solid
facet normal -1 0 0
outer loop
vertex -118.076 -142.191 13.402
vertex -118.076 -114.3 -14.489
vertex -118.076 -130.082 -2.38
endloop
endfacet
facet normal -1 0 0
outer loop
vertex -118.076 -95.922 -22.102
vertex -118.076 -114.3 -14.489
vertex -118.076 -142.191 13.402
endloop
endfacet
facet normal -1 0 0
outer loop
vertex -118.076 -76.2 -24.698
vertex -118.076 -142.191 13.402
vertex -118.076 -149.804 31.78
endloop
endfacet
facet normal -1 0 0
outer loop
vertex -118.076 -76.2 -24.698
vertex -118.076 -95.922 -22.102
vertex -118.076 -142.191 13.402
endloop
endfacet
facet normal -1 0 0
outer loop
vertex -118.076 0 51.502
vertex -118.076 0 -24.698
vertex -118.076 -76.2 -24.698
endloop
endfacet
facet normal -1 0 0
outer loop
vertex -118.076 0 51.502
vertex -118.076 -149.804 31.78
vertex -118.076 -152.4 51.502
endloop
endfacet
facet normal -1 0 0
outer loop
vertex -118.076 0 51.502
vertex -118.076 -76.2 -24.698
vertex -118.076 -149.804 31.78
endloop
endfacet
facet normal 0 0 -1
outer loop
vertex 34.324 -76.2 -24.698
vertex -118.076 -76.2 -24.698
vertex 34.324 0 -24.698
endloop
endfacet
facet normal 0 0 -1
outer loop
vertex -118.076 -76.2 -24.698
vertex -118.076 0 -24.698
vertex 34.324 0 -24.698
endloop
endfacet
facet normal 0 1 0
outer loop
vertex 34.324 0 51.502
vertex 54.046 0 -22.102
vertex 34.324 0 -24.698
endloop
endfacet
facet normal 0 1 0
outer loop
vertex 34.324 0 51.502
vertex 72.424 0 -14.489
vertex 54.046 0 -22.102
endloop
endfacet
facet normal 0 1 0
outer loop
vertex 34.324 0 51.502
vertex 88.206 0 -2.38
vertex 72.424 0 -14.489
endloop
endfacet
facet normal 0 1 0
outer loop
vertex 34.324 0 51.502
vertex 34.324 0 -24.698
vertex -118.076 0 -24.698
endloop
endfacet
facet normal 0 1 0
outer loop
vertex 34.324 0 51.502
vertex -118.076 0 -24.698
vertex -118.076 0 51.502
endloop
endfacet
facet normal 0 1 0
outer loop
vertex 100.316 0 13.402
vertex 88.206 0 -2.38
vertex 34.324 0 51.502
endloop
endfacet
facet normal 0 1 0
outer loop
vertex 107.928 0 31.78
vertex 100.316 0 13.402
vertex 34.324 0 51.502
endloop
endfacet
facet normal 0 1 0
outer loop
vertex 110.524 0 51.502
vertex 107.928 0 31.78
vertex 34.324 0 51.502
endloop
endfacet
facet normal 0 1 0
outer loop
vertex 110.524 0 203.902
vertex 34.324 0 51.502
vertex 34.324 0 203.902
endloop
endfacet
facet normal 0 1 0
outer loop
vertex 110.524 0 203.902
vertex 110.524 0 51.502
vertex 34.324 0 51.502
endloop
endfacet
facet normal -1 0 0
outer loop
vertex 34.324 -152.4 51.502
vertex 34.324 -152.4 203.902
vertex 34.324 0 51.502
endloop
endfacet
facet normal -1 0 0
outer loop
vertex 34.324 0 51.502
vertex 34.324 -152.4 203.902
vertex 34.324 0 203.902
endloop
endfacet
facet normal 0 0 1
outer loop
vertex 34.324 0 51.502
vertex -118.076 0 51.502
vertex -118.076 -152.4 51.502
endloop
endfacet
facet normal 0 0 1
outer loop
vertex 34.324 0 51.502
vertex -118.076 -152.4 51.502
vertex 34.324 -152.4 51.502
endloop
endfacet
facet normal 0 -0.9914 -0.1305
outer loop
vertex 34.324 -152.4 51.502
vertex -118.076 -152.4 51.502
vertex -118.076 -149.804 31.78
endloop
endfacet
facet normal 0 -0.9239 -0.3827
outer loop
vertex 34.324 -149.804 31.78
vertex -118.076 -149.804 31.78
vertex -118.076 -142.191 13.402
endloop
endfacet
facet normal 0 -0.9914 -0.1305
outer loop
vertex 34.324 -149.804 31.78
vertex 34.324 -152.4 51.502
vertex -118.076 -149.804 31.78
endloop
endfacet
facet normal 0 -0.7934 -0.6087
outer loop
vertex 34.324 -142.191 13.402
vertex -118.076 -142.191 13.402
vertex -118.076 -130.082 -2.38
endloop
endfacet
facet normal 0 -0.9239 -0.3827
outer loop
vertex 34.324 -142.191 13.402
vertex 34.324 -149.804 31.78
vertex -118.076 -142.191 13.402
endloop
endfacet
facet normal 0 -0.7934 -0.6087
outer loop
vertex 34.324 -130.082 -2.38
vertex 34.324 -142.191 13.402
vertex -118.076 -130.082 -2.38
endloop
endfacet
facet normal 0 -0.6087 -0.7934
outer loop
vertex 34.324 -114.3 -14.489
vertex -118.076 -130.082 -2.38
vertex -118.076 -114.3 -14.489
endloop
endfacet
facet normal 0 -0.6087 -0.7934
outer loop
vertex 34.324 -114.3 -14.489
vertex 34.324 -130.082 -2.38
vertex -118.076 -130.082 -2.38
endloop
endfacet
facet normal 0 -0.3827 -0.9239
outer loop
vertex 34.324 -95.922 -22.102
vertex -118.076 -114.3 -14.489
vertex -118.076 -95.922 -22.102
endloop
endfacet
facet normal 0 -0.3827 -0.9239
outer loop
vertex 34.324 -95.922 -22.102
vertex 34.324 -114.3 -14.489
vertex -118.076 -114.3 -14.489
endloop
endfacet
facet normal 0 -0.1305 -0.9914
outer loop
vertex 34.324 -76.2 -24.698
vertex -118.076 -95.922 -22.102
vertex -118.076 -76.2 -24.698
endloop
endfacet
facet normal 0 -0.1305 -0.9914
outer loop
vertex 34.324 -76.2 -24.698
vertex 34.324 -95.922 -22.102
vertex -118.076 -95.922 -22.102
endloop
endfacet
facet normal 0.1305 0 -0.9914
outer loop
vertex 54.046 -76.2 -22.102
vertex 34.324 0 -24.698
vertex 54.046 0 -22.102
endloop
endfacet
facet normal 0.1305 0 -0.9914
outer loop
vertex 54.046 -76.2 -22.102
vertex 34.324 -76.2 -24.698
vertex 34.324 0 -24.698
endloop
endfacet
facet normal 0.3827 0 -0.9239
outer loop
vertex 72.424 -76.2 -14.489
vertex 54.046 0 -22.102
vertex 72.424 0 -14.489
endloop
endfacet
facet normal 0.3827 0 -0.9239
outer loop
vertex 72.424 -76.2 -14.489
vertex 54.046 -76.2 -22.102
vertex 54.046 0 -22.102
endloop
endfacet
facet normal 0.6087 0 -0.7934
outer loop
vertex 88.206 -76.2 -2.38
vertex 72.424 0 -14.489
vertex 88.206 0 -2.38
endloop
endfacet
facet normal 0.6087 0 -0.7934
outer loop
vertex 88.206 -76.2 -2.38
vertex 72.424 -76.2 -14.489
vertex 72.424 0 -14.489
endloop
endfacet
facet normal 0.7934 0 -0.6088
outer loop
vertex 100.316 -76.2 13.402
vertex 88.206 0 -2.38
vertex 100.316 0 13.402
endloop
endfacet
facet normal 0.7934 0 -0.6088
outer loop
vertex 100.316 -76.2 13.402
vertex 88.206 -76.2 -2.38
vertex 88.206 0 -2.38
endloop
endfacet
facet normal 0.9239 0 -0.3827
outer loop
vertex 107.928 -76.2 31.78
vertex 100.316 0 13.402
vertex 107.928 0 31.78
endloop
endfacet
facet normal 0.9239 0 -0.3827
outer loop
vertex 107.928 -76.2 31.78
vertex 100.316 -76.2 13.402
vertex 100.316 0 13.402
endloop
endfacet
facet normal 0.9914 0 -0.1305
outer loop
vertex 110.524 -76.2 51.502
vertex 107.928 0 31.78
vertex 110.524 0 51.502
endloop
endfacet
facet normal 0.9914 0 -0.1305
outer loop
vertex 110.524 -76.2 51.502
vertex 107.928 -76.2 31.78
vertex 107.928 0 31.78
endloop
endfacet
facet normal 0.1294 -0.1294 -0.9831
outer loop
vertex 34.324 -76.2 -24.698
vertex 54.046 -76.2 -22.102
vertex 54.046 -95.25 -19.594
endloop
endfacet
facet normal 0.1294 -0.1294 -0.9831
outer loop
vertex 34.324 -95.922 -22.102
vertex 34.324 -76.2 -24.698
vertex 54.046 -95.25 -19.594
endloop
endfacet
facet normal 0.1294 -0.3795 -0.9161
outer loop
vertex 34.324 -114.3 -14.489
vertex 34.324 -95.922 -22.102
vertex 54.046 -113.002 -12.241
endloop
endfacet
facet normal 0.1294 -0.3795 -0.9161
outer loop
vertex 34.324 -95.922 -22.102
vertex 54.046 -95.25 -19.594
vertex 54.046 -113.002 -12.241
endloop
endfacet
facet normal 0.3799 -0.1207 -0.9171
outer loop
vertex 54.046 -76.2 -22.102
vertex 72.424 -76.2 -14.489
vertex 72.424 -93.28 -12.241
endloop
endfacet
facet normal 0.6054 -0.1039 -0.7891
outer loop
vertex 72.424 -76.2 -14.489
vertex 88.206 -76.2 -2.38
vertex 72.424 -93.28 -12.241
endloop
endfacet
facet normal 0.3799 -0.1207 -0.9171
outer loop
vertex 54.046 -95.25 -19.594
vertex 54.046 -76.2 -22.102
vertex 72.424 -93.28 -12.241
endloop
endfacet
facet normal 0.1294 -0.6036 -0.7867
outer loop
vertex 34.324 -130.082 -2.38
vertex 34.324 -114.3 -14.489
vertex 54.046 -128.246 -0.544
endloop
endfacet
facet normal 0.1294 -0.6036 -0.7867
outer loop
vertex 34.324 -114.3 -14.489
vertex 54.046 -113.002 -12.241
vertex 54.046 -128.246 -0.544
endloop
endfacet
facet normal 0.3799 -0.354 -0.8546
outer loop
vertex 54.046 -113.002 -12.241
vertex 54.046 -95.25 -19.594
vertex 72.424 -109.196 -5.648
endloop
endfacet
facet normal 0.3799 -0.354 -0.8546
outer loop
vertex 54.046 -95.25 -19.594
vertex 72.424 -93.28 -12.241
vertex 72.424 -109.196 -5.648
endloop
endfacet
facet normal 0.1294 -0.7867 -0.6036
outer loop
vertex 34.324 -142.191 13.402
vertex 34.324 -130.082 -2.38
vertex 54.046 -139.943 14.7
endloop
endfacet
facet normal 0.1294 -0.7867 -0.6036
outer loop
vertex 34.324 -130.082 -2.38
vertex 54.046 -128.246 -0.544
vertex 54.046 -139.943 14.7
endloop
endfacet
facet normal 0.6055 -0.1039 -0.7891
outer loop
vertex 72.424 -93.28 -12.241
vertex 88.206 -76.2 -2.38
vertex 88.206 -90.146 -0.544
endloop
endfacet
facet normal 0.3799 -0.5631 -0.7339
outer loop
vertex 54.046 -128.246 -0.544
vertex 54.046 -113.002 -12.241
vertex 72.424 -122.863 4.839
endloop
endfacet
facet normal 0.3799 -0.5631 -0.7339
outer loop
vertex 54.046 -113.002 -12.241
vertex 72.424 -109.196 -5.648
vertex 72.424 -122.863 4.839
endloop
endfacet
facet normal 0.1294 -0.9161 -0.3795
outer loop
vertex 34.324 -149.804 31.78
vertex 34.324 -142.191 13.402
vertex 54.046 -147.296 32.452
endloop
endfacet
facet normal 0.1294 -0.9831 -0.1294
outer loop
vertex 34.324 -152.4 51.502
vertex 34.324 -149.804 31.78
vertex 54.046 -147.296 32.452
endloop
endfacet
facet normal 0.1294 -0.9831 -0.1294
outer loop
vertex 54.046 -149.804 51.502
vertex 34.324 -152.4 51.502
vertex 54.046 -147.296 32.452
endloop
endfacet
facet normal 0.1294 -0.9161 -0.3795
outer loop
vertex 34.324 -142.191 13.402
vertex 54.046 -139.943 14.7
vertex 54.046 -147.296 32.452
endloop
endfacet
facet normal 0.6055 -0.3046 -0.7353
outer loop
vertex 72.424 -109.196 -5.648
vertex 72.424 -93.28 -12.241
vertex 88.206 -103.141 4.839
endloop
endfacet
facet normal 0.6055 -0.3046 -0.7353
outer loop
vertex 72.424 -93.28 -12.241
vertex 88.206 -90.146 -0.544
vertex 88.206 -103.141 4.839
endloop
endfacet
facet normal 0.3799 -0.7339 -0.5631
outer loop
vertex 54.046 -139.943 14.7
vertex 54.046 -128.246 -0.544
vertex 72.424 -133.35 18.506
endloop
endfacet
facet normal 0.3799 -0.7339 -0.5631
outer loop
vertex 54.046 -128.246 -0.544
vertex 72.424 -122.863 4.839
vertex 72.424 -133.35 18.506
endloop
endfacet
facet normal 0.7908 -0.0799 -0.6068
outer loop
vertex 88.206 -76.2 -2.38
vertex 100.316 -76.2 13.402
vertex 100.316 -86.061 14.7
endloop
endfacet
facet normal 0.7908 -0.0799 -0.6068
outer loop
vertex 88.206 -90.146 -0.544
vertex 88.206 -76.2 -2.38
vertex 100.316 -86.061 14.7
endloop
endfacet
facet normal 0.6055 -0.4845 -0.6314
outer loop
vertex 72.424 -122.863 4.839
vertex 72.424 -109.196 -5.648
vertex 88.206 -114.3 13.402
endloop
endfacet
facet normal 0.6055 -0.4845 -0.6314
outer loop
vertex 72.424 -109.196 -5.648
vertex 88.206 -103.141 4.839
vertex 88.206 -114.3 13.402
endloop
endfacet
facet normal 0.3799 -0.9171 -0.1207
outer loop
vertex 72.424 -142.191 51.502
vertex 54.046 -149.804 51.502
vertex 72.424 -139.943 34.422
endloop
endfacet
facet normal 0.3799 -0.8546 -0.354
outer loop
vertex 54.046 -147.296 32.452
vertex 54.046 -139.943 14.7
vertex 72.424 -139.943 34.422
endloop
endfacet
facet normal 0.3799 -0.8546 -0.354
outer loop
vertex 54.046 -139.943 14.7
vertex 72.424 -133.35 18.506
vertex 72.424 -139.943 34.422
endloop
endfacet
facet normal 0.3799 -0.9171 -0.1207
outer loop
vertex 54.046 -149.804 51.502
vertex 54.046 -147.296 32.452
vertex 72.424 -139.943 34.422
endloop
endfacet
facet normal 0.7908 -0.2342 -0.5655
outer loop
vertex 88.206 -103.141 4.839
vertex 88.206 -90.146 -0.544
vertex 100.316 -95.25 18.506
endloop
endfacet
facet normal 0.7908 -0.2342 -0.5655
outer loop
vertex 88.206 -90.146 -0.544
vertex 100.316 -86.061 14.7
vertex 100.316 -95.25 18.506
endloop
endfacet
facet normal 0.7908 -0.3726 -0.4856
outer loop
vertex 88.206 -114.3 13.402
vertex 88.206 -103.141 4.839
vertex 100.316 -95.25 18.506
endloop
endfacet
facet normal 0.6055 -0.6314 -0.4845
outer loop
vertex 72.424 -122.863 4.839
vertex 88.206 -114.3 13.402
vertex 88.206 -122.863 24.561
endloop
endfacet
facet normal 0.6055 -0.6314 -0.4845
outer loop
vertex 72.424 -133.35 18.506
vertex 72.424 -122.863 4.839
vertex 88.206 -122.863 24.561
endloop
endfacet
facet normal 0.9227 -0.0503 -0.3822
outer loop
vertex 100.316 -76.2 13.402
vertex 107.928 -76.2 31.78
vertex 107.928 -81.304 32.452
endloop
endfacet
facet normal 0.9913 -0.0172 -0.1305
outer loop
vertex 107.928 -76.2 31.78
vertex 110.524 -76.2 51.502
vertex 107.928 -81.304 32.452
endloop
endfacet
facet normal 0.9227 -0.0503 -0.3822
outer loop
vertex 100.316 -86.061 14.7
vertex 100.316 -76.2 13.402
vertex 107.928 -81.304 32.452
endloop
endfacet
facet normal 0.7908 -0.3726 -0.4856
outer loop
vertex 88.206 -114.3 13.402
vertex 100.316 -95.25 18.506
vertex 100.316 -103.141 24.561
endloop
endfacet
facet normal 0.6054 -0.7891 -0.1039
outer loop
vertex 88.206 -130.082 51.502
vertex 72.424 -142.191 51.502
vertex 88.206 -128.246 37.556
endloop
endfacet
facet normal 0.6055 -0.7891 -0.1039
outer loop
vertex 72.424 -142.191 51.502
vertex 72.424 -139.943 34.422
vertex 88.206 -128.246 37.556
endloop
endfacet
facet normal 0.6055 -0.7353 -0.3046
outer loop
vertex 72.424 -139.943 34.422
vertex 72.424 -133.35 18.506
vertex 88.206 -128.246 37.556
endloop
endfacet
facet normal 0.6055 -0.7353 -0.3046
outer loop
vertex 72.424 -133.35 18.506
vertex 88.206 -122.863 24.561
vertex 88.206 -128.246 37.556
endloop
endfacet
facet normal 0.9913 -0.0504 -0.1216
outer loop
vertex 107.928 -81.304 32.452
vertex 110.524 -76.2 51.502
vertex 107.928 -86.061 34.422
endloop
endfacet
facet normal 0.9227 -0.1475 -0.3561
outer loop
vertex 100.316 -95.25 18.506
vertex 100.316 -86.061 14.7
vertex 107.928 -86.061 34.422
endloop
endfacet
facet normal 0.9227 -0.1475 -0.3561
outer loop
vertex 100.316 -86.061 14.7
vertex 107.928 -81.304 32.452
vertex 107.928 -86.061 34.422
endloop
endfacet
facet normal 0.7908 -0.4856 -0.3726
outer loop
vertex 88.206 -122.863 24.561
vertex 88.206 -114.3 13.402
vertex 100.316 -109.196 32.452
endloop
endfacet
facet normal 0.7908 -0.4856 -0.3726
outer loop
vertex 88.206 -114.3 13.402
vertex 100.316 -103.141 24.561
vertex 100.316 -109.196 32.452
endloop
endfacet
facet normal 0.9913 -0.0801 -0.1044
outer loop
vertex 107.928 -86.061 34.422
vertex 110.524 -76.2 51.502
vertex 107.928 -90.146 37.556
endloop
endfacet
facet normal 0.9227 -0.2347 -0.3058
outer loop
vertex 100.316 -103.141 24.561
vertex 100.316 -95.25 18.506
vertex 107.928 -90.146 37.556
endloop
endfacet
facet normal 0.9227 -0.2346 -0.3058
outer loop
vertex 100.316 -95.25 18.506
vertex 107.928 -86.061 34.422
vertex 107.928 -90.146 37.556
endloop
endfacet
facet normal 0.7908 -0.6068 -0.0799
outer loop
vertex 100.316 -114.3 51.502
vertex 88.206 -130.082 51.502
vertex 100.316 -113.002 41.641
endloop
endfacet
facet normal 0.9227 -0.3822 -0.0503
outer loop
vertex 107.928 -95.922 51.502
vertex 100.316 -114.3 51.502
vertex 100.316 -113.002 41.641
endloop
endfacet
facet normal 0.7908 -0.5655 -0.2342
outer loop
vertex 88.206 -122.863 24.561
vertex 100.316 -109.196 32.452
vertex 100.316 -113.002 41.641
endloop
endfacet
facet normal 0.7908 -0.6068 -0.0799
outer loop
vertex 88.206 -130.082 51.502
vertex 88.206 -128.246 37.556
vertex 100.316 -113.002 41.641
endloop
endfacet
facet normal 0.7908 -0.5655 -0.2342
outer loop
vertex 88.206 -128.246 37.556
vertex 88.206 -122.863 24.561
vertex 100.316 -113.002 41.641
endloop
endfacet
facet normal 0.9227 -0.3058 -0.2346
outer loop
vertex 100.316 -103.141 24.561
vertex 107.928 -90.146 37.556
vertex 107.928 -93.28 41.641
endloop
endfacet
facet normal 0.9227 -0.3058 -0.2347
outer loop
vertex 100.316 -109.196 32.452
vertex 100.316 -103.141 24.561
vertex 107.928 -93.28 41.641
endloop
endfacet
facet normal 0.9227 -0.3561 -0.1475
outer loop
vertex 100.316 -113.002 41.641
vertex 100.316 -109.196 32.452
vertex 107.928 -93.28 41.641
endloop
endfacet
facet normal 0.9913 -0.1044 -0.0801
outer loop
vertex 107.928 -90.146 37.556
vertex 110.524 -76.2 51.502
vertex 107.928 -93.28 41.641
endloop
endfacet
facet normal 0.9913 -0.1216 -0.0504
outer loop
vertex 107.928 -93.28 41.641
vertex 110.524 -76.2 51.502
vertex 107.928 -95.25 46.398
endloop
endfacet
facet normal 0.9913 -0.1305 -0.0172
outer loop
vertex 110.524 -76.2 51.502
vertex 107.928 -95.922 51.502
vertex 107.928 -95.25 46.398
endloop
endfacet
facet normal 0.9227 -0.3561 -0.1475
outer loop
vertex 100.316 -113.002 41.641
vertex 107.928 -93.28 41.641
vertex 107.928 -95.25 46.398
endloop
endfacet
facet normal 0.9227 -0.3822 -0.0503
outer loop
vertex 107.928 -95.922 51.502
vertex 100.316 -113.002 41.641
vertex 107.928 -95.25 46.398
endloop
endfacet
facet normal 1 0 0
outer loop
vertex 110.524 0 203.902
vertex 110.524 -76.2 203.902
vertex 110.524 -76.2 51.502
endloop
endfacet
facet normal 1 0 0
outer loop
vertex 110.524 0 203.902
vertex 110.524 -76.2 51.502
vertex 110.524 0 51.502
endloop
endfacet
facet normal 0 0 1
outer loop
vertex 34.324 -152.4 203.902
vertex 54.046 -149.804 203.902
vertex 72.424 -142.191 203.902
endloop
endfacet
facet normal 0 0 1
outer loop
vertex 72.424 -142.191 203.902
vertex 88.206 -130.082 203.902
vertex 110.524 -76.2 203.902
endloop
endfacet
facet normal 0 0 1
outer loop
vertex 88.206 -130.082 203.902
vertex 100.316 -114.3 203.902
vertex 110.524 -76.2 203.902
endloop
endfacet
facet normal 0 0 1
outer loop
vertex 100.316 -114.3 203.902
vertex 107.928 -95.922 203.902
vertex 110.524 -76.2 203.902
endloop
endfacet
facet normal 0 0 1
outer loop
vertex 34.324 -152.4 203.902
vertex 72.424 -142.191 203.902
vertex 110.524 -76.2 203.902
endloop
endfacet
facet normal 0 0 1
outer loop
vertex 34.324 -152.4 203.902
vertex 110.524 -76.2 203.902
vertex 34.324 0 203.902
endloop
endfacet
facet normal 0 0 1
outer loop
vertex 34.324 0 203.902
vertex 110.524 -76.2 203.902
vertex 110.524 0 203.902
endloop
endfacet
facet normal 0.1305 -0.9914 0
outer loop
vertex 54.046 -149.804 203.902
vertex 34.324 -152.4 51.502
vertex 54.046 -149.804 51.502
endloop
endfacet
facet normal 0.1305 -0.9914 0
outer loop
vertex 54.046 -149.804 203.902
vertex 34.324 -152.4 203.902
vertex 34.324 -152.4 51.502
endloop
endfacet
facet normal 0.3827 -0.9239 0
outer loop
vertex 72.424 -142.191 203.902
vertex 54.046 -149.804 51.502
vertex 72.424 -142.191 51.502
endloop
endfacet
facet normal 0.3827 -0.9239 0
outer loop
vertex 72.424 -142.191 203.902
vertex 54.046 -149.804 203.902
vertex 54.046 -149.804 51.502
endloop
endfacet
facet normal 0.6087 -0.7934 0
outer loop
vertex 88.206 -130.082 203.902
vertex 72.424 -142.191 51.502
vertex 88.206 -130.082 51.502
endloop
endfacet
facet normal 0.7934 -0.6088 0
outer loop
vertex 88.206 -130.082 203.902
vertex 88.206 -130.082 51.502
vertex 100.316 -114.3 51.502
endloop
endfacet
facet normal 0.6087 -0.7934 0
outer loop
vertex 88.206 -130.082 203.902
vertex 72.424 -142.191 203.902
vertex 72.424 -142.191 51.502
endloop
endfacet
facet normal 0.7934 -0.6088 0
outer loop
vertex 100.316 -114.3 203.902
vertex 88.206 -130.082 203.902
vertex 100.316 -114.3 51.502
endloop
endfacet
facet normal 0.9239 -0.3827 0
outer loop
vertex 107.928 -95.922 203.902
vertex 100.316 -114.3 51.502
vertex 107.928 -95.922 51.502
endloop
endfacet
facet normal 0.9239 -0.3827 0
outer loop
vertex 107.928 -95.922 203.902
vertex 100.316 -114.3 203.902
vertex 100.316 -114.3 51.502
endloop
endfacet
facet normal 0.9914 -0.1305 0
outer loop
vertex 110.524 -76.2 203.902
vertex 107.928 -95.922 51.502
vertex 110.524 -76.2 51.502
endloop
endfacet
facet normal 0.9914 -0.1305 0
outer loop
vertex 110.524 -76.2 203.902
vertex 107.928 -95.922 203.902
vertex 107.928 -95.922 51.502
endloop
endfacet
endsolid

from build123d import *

# Parameters (mm, degrees)
F0_W     = 228.6
F0_H     = 76.2
F1_DEPTH = 152.4
F2_W     = 152.4
F2_H     = 152.4
F2_H_2   = 76.2
F3_DEPTH = 76.2
F4_R     = 76.2
F5_R     = 76.19999


# Not quite as in the source:
# - a fillet or chamfer is up to 0.001 mm smaller than in the source, because OpenCascade refuses the exact size


with BuildPart() as f1:
    # F0 (on Front) → F1 (new body)
    with BuildSketch(Plane.XZ):
        with Locations((-3.7755966187, 13.4019921658)):
            Rectangle(F0_W, F0_H)
    extrude(amount=F1_DEPTH)

    # F2 (on face) → F3 (join)
    with BuildSketch(Plane.YZ.offset(110.5244033813)):
        with Locations((-76.2, 127.7019921658)):
            Rectangle(F2_W, F2_H)
        with Locations((-76.2, 13.4019921658)):
            Rectangle(F2_W, F2_H_2)
    extrude(amount=-F3_DEPTH)

    # F4
    f4_edges = [f1.edges().sort_by_distance(p)[0] for p in [
        (-3.775597, -152.4, -24.698008),
    ]]
    fillet(f4_edges, radius=F4_R)

    # F5 (radius 76.2 in the source; OpenCascade refuses exactly that, so slightly less here)
    f5_edges = [f1.edges().sort_by_distance(p)[0] for p in [
        (110.524403, -152.4, 127.701992),
    ]]
    fillet(f5_edges, radius=F5_R)


solid = f1.part
